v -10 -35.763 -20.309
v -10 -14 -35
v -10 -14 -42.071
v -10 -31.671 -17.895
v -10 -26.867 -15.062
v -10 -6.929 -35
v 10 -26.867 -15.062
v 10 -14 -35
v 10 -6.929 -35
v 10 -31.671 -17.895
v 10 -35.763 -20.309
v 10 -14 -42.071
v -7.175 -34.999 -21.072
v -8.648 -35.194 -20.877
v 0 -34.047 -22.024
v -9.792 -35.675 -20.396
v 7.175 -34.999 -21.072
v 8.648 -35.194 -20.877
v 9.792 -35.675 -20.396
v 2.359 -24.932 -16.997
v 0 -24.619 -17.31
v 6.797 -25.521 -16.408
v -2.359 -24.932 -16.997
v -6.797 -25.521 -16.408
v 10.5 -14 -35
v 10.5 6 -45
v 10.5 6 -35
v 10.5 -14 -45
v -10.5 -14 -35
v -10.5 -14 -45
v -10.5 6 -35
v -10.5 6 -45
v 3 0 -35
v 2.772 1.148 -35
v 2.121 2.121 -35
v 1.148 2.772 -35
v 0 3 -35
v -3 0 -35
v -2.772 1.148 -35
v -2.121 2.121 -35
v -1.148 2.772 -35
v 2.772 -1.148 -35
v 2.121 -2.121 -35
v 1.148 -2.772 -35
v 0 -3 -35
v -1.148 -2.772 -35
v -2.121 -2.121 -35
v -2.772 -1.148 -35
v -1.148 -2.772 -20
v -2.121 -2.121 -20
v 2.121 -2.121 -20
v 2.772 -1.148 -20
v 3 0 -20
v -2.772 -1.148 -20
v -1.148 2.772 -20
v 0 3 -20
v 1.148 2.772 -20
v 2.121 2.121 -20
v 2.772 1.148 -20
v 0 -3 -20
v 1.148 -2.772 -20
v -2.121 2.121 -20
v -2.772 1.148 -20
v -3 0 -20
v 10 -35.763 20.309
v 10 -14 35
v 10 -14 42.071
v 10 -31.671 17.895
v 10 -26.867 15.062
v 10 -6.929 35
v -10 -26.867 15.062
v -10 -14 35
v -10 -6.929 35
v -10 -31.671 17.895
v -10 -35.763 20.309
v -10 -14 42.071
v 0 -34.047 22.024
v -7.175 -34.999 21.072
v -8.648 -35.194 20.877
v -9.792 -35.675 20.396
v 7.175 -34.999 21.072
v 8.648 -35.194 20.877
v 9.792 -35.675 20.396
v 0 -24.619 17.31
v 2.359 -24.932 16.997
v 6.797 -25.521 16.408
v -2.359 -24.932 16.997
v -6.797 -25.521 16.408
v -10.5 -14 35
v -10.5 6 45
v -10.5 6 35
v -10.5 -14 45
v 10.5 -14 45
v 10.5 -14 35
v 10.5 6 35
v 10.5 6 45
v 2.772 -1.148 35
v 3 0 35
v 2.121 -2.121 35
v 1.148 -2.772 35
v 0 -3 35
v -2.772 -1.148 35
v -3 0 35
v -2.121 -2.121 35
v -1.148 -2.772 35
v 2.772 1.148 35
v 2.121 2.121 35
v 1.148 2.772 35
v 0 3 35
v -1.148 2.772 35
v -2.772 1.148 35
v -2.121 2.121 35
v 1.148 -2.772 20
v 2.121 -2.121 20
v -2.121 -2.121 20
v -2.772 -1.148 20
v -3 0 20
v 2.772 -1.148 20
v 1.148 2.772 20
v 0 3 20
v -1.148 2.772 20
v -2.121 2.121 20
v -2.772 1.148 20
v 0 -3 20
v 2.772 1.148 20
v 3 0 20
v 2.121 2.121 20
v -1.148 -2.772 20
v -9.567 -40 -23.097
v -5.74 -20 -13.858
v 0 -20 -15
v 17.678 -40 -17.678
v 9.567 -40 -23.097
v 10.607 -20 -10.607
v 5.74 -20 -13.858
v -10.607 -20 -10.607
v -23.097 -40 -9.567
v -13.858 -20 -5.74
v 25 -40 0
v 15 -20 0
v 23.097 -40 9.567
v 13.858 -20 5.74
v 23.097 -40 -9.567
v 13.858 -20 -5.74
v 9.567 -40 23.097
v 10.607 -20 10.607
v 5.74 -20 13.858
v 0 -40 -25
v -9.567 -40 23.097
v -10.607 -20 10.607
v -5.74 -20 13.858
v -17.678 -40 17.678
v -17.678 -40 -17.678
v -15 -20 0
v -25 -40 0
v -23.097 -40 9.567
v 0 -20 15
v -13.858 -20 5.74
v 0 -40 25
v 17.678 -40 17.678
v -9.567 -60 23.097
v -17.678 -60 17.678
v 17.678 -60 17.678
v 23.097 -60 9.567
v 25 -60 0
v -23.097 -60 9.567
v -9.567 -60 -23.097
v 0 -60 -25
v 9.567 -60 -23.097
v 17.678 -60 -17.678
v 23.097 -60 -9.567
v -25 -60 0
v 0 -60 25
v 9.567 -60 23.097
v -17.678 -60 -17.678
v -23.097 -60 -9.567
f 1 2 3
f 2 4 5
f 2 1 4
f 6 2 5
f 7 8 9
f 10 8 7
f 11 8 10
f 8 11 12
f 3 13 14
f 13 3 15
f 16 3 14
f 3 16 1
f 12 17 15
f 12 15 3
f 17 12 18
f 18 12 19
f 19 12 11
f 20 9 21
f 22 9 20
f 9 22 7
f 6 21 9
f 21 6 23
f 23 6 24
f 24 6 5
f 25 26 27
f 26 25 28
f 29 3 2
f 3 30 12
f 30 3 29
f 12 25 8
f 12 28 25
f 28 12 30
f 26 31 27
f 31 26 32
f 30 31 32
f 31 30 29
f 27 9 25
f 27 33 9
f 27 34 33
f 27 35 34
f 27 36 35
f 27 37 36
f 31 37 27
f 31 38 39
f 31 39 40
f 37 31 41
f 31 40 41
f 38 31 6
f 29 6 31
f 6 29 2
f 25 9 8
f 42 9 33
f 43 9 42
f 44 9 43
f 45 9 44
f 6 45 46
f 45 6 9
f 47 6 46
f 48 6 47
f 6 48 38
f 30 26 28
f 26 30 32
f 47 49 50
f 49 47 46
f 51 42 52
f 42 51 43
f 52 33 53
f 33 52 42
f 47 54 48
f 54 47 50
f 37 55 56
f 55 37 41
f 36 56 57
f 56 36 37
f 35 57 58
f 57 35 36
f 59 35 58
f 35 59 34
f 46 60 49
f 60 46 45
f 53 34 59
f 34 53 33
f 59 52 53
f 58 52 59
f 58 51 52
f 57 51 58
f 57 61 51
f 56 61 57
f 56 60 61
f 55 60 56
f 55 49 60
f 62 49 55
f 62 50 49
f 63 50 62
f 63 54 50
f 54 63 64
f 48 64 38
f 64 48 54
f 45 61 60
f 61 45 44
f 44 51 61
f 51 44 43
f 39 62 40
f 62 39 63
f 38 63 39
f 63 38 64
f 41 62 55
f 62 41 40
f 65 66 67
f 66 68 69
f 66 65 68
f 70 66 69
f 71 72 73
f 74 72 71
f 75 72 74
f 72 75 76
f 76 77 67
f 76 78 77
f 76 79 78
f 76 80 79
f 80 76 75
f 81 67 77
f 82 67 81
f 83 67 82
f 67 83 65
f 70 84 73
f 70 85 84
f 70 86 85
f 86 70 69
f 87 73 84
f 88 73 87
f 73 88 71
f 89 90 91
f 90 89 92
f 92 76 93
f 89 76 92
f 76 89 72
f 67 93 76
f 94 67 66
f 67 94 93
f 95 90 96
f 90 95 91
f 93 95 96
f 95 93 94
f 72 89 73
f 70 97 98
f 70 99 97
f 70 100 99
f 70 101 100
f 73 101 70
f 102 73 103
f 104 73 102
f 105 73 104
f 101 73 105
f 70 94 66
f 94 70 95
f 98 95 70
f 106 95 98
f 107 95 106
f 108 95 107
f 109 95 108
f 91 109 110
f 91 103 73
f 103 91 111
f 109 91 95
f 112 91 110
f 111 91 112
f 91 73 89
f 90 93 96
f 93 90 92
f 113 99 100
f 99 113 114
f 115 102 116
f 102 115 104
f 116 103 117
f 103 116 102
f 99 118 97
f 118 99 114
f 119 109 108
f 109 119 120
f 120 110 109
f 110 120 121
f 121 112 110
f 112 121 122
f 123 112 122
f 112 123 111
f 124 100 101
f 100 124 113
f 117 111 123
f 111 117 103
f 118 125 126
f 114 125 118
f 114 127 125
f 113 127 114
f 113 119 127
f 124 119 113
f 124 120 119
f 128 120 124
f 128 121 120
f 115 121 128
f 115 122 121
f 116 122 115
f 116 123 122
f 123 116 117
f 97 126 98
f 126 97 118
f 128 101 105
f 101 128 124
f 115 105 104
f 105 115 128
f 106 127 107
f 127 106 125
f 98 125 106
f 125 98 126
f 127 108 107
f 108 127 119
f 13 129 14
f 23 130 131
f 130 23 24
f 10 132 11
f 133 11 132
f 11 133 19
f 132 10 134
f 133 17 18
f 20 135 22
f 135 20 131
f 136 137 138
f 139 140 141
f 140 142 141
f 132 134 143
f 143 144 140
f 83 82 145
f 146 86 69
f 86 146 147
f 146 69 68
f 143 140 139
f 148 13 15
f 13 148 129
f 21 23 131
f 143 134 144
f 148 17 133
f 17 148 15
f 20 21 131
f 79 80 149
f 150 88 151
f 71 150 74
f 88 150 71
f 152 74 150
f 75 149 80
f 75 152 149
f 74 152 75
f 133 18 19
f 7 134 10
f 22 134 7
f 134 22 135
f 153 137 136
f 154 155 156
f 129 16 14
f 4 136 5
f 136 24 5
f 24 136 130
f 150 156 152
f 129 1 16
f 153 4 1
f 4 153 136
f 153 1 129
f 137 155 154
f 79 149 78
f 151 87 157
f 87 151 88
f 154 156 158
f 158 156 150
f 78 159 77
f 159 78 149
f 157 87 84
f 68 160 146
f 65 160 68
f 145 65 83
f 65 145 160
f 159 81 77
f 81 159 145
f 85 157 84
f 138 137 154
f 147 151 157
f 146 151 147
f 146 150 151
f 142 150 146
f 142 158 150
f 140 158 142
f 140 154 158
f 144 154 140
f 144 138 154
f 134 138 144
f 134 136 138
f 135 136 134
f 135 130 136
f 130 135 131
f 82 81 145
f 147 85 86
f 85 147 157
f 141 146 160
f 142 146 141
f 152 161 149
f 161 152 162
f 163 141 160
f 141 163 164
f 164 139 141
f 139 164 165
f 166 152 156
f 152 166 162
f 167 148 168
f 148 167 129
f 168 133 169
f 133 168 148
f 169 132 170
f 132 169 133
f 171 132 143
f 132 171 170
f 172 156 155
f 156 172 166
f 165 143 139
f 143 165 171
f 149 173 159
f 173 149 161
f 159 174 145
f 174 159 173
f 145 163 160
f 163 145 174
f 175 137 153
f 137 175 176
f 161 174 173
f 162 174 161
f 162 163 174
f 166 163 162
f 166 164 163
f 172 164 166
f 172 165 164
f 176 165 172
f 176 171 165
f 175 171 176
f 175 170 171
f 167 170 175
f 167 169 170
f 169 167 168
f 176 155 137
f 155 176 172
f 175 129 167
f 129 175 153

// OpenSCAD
$fn = 16;

module turret_base_arm()
{
	union() {
		translate(v = [0, -29, 20])
			rotate(v = [1, 0, 0], a = 45)
				cube(size = [20, 35, 10], center = true);
		translate(v = [0, -40, 4])
				cube(size = [21, 10, 20], center = true);
		translate(v = [0, -20, 0])
			rotate(v = [1, 0, 0], a = 90)
				cylinder(h = 25, r1 = 3, r2 = 3);
	}
}

module turret_base()
{
	union() {
		translate(v = [0, 0, 30])
			cylinder(h = 20, r1 = 15, r2 = 25, center = true);
		translate(v = [0, 0, 50])
			cylinder(h = 20, r1 = 25, r2 = 25, center = true);
		turret_base_arm();
		rotate(v = [0, 0, 1], a = 180)
			turret_base_arm();
	}
}

rotate(v = [1, 0, 0], 90)
	turret_base();
